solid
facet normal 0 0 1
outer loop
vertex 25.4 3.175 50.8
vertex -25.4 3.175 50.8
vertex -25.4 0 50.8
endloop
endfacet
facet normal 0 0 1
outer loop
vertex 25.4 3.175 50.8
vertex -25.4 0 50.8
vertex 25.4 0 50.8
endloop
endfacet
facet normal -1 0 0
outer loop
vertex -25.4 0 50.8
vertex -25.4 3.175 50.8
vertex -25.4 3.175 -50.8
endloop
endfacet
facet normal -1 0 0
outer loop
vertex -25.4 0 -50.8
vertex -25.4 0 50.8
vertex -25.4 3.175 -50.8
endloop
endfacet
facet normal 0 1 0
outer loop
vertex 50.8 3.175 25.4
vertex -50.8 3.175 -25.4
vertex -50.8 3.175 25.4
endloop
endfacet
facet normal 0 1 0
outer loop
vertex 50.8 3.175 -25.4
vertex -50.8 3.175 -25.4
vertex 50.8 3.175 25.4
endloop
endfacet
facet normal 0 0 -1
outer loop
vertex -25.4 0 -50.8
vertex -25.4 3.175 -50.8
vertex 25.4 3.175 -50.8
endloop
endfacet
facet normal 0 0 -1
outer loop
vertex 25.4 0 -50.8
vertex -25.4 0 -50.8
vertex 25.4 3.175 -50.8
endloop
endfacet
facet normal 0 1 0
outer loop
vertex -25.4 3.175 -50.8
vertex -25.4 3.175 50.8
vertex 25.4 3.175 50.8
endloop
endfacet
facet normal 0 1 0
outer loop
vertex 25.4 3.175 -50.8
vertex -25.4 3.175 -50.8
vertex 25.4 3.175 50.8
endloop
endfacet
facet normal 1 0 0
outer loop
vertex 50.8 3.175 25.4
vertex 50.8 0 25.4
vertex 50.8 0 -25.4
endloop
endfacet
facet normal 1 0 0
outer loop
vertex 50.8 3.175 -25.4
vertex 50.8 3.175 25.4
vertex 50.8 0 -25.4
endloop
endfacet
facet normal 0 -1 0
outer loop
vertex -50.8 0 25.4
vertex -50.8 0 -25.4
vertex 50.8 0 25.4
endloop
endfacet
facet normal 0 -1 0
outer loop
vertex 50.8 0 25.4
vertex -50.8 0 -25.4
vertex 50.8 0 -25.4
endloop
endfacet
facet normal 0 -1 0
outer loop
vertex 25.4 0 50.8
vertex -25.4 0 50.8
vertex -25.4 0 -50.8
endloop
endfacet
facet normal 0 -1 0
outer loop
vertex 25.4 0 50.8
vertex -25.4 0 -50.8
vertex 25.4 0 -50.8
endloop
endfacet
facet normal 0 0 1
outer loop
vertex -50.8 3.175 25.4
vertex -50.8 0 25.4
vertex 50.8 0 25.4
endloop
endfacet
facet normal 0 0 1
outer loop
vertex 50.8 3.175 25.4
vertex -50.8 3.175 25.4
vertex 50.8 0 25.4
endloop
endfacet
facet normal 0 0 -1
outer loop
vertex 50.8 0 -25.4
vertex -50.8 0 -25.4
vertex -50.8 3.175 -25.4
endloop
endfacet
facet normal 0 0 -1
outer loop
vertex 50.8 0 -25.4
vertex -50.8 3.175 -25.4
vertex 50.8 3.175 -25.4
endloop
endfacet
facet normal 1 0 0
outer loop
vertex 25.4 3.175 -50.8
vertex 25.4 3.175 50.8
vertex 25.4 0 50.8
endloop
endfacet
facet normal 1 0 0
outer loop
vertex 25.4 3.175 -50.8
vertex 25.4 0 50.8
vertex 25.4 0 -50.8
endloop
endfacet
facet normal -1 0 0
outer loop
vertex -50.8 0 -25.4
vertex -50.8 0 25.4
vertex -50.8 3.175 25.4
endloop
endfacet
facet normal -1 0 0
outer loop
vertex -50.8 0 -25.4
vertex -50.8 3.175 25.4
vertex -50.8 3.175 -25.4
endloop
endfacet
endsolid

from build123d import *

# Parameters (mm, degrees)
SKETCH2_W           = 101.6
SKETCH2_H           = 50.8
BOSS_EXTRUDE2_DEPTH = 3.175
SKETCH3_W           = 50.8
SKETCH3_H           = 101.6
BOSS_EXTRUDE3_DEPTH = 3.175


with BuildPart() as part:
    # Sketch2 → Boss-Extrude2 (new body)
    with BuildSketch(Plane(origin=(0, 0, 0), x_dir=(1, 0, 0), z_dir=(0, 1, 0))):
        Rectangle(SKETCH2_W, SKETCH2_H)
    extrude(amount=BOSS_EXTRUDE2_DEPTH)


with BuildPart() as body_2:
    # Sketch3 → Boss-Extrude3 (new body)
    with BuildSketch(Plane(origin=(0, 3.175, 0), x_dir=(1, 0, 0), z_dir=(0, 1, 0))):
        Rectangle(SKETCH3_W, SKETCH3_H)
    extrude(amount=-BOSS_EXTRUDE3_DEPTH)


solid = Compound([part.part, body_2.part])
